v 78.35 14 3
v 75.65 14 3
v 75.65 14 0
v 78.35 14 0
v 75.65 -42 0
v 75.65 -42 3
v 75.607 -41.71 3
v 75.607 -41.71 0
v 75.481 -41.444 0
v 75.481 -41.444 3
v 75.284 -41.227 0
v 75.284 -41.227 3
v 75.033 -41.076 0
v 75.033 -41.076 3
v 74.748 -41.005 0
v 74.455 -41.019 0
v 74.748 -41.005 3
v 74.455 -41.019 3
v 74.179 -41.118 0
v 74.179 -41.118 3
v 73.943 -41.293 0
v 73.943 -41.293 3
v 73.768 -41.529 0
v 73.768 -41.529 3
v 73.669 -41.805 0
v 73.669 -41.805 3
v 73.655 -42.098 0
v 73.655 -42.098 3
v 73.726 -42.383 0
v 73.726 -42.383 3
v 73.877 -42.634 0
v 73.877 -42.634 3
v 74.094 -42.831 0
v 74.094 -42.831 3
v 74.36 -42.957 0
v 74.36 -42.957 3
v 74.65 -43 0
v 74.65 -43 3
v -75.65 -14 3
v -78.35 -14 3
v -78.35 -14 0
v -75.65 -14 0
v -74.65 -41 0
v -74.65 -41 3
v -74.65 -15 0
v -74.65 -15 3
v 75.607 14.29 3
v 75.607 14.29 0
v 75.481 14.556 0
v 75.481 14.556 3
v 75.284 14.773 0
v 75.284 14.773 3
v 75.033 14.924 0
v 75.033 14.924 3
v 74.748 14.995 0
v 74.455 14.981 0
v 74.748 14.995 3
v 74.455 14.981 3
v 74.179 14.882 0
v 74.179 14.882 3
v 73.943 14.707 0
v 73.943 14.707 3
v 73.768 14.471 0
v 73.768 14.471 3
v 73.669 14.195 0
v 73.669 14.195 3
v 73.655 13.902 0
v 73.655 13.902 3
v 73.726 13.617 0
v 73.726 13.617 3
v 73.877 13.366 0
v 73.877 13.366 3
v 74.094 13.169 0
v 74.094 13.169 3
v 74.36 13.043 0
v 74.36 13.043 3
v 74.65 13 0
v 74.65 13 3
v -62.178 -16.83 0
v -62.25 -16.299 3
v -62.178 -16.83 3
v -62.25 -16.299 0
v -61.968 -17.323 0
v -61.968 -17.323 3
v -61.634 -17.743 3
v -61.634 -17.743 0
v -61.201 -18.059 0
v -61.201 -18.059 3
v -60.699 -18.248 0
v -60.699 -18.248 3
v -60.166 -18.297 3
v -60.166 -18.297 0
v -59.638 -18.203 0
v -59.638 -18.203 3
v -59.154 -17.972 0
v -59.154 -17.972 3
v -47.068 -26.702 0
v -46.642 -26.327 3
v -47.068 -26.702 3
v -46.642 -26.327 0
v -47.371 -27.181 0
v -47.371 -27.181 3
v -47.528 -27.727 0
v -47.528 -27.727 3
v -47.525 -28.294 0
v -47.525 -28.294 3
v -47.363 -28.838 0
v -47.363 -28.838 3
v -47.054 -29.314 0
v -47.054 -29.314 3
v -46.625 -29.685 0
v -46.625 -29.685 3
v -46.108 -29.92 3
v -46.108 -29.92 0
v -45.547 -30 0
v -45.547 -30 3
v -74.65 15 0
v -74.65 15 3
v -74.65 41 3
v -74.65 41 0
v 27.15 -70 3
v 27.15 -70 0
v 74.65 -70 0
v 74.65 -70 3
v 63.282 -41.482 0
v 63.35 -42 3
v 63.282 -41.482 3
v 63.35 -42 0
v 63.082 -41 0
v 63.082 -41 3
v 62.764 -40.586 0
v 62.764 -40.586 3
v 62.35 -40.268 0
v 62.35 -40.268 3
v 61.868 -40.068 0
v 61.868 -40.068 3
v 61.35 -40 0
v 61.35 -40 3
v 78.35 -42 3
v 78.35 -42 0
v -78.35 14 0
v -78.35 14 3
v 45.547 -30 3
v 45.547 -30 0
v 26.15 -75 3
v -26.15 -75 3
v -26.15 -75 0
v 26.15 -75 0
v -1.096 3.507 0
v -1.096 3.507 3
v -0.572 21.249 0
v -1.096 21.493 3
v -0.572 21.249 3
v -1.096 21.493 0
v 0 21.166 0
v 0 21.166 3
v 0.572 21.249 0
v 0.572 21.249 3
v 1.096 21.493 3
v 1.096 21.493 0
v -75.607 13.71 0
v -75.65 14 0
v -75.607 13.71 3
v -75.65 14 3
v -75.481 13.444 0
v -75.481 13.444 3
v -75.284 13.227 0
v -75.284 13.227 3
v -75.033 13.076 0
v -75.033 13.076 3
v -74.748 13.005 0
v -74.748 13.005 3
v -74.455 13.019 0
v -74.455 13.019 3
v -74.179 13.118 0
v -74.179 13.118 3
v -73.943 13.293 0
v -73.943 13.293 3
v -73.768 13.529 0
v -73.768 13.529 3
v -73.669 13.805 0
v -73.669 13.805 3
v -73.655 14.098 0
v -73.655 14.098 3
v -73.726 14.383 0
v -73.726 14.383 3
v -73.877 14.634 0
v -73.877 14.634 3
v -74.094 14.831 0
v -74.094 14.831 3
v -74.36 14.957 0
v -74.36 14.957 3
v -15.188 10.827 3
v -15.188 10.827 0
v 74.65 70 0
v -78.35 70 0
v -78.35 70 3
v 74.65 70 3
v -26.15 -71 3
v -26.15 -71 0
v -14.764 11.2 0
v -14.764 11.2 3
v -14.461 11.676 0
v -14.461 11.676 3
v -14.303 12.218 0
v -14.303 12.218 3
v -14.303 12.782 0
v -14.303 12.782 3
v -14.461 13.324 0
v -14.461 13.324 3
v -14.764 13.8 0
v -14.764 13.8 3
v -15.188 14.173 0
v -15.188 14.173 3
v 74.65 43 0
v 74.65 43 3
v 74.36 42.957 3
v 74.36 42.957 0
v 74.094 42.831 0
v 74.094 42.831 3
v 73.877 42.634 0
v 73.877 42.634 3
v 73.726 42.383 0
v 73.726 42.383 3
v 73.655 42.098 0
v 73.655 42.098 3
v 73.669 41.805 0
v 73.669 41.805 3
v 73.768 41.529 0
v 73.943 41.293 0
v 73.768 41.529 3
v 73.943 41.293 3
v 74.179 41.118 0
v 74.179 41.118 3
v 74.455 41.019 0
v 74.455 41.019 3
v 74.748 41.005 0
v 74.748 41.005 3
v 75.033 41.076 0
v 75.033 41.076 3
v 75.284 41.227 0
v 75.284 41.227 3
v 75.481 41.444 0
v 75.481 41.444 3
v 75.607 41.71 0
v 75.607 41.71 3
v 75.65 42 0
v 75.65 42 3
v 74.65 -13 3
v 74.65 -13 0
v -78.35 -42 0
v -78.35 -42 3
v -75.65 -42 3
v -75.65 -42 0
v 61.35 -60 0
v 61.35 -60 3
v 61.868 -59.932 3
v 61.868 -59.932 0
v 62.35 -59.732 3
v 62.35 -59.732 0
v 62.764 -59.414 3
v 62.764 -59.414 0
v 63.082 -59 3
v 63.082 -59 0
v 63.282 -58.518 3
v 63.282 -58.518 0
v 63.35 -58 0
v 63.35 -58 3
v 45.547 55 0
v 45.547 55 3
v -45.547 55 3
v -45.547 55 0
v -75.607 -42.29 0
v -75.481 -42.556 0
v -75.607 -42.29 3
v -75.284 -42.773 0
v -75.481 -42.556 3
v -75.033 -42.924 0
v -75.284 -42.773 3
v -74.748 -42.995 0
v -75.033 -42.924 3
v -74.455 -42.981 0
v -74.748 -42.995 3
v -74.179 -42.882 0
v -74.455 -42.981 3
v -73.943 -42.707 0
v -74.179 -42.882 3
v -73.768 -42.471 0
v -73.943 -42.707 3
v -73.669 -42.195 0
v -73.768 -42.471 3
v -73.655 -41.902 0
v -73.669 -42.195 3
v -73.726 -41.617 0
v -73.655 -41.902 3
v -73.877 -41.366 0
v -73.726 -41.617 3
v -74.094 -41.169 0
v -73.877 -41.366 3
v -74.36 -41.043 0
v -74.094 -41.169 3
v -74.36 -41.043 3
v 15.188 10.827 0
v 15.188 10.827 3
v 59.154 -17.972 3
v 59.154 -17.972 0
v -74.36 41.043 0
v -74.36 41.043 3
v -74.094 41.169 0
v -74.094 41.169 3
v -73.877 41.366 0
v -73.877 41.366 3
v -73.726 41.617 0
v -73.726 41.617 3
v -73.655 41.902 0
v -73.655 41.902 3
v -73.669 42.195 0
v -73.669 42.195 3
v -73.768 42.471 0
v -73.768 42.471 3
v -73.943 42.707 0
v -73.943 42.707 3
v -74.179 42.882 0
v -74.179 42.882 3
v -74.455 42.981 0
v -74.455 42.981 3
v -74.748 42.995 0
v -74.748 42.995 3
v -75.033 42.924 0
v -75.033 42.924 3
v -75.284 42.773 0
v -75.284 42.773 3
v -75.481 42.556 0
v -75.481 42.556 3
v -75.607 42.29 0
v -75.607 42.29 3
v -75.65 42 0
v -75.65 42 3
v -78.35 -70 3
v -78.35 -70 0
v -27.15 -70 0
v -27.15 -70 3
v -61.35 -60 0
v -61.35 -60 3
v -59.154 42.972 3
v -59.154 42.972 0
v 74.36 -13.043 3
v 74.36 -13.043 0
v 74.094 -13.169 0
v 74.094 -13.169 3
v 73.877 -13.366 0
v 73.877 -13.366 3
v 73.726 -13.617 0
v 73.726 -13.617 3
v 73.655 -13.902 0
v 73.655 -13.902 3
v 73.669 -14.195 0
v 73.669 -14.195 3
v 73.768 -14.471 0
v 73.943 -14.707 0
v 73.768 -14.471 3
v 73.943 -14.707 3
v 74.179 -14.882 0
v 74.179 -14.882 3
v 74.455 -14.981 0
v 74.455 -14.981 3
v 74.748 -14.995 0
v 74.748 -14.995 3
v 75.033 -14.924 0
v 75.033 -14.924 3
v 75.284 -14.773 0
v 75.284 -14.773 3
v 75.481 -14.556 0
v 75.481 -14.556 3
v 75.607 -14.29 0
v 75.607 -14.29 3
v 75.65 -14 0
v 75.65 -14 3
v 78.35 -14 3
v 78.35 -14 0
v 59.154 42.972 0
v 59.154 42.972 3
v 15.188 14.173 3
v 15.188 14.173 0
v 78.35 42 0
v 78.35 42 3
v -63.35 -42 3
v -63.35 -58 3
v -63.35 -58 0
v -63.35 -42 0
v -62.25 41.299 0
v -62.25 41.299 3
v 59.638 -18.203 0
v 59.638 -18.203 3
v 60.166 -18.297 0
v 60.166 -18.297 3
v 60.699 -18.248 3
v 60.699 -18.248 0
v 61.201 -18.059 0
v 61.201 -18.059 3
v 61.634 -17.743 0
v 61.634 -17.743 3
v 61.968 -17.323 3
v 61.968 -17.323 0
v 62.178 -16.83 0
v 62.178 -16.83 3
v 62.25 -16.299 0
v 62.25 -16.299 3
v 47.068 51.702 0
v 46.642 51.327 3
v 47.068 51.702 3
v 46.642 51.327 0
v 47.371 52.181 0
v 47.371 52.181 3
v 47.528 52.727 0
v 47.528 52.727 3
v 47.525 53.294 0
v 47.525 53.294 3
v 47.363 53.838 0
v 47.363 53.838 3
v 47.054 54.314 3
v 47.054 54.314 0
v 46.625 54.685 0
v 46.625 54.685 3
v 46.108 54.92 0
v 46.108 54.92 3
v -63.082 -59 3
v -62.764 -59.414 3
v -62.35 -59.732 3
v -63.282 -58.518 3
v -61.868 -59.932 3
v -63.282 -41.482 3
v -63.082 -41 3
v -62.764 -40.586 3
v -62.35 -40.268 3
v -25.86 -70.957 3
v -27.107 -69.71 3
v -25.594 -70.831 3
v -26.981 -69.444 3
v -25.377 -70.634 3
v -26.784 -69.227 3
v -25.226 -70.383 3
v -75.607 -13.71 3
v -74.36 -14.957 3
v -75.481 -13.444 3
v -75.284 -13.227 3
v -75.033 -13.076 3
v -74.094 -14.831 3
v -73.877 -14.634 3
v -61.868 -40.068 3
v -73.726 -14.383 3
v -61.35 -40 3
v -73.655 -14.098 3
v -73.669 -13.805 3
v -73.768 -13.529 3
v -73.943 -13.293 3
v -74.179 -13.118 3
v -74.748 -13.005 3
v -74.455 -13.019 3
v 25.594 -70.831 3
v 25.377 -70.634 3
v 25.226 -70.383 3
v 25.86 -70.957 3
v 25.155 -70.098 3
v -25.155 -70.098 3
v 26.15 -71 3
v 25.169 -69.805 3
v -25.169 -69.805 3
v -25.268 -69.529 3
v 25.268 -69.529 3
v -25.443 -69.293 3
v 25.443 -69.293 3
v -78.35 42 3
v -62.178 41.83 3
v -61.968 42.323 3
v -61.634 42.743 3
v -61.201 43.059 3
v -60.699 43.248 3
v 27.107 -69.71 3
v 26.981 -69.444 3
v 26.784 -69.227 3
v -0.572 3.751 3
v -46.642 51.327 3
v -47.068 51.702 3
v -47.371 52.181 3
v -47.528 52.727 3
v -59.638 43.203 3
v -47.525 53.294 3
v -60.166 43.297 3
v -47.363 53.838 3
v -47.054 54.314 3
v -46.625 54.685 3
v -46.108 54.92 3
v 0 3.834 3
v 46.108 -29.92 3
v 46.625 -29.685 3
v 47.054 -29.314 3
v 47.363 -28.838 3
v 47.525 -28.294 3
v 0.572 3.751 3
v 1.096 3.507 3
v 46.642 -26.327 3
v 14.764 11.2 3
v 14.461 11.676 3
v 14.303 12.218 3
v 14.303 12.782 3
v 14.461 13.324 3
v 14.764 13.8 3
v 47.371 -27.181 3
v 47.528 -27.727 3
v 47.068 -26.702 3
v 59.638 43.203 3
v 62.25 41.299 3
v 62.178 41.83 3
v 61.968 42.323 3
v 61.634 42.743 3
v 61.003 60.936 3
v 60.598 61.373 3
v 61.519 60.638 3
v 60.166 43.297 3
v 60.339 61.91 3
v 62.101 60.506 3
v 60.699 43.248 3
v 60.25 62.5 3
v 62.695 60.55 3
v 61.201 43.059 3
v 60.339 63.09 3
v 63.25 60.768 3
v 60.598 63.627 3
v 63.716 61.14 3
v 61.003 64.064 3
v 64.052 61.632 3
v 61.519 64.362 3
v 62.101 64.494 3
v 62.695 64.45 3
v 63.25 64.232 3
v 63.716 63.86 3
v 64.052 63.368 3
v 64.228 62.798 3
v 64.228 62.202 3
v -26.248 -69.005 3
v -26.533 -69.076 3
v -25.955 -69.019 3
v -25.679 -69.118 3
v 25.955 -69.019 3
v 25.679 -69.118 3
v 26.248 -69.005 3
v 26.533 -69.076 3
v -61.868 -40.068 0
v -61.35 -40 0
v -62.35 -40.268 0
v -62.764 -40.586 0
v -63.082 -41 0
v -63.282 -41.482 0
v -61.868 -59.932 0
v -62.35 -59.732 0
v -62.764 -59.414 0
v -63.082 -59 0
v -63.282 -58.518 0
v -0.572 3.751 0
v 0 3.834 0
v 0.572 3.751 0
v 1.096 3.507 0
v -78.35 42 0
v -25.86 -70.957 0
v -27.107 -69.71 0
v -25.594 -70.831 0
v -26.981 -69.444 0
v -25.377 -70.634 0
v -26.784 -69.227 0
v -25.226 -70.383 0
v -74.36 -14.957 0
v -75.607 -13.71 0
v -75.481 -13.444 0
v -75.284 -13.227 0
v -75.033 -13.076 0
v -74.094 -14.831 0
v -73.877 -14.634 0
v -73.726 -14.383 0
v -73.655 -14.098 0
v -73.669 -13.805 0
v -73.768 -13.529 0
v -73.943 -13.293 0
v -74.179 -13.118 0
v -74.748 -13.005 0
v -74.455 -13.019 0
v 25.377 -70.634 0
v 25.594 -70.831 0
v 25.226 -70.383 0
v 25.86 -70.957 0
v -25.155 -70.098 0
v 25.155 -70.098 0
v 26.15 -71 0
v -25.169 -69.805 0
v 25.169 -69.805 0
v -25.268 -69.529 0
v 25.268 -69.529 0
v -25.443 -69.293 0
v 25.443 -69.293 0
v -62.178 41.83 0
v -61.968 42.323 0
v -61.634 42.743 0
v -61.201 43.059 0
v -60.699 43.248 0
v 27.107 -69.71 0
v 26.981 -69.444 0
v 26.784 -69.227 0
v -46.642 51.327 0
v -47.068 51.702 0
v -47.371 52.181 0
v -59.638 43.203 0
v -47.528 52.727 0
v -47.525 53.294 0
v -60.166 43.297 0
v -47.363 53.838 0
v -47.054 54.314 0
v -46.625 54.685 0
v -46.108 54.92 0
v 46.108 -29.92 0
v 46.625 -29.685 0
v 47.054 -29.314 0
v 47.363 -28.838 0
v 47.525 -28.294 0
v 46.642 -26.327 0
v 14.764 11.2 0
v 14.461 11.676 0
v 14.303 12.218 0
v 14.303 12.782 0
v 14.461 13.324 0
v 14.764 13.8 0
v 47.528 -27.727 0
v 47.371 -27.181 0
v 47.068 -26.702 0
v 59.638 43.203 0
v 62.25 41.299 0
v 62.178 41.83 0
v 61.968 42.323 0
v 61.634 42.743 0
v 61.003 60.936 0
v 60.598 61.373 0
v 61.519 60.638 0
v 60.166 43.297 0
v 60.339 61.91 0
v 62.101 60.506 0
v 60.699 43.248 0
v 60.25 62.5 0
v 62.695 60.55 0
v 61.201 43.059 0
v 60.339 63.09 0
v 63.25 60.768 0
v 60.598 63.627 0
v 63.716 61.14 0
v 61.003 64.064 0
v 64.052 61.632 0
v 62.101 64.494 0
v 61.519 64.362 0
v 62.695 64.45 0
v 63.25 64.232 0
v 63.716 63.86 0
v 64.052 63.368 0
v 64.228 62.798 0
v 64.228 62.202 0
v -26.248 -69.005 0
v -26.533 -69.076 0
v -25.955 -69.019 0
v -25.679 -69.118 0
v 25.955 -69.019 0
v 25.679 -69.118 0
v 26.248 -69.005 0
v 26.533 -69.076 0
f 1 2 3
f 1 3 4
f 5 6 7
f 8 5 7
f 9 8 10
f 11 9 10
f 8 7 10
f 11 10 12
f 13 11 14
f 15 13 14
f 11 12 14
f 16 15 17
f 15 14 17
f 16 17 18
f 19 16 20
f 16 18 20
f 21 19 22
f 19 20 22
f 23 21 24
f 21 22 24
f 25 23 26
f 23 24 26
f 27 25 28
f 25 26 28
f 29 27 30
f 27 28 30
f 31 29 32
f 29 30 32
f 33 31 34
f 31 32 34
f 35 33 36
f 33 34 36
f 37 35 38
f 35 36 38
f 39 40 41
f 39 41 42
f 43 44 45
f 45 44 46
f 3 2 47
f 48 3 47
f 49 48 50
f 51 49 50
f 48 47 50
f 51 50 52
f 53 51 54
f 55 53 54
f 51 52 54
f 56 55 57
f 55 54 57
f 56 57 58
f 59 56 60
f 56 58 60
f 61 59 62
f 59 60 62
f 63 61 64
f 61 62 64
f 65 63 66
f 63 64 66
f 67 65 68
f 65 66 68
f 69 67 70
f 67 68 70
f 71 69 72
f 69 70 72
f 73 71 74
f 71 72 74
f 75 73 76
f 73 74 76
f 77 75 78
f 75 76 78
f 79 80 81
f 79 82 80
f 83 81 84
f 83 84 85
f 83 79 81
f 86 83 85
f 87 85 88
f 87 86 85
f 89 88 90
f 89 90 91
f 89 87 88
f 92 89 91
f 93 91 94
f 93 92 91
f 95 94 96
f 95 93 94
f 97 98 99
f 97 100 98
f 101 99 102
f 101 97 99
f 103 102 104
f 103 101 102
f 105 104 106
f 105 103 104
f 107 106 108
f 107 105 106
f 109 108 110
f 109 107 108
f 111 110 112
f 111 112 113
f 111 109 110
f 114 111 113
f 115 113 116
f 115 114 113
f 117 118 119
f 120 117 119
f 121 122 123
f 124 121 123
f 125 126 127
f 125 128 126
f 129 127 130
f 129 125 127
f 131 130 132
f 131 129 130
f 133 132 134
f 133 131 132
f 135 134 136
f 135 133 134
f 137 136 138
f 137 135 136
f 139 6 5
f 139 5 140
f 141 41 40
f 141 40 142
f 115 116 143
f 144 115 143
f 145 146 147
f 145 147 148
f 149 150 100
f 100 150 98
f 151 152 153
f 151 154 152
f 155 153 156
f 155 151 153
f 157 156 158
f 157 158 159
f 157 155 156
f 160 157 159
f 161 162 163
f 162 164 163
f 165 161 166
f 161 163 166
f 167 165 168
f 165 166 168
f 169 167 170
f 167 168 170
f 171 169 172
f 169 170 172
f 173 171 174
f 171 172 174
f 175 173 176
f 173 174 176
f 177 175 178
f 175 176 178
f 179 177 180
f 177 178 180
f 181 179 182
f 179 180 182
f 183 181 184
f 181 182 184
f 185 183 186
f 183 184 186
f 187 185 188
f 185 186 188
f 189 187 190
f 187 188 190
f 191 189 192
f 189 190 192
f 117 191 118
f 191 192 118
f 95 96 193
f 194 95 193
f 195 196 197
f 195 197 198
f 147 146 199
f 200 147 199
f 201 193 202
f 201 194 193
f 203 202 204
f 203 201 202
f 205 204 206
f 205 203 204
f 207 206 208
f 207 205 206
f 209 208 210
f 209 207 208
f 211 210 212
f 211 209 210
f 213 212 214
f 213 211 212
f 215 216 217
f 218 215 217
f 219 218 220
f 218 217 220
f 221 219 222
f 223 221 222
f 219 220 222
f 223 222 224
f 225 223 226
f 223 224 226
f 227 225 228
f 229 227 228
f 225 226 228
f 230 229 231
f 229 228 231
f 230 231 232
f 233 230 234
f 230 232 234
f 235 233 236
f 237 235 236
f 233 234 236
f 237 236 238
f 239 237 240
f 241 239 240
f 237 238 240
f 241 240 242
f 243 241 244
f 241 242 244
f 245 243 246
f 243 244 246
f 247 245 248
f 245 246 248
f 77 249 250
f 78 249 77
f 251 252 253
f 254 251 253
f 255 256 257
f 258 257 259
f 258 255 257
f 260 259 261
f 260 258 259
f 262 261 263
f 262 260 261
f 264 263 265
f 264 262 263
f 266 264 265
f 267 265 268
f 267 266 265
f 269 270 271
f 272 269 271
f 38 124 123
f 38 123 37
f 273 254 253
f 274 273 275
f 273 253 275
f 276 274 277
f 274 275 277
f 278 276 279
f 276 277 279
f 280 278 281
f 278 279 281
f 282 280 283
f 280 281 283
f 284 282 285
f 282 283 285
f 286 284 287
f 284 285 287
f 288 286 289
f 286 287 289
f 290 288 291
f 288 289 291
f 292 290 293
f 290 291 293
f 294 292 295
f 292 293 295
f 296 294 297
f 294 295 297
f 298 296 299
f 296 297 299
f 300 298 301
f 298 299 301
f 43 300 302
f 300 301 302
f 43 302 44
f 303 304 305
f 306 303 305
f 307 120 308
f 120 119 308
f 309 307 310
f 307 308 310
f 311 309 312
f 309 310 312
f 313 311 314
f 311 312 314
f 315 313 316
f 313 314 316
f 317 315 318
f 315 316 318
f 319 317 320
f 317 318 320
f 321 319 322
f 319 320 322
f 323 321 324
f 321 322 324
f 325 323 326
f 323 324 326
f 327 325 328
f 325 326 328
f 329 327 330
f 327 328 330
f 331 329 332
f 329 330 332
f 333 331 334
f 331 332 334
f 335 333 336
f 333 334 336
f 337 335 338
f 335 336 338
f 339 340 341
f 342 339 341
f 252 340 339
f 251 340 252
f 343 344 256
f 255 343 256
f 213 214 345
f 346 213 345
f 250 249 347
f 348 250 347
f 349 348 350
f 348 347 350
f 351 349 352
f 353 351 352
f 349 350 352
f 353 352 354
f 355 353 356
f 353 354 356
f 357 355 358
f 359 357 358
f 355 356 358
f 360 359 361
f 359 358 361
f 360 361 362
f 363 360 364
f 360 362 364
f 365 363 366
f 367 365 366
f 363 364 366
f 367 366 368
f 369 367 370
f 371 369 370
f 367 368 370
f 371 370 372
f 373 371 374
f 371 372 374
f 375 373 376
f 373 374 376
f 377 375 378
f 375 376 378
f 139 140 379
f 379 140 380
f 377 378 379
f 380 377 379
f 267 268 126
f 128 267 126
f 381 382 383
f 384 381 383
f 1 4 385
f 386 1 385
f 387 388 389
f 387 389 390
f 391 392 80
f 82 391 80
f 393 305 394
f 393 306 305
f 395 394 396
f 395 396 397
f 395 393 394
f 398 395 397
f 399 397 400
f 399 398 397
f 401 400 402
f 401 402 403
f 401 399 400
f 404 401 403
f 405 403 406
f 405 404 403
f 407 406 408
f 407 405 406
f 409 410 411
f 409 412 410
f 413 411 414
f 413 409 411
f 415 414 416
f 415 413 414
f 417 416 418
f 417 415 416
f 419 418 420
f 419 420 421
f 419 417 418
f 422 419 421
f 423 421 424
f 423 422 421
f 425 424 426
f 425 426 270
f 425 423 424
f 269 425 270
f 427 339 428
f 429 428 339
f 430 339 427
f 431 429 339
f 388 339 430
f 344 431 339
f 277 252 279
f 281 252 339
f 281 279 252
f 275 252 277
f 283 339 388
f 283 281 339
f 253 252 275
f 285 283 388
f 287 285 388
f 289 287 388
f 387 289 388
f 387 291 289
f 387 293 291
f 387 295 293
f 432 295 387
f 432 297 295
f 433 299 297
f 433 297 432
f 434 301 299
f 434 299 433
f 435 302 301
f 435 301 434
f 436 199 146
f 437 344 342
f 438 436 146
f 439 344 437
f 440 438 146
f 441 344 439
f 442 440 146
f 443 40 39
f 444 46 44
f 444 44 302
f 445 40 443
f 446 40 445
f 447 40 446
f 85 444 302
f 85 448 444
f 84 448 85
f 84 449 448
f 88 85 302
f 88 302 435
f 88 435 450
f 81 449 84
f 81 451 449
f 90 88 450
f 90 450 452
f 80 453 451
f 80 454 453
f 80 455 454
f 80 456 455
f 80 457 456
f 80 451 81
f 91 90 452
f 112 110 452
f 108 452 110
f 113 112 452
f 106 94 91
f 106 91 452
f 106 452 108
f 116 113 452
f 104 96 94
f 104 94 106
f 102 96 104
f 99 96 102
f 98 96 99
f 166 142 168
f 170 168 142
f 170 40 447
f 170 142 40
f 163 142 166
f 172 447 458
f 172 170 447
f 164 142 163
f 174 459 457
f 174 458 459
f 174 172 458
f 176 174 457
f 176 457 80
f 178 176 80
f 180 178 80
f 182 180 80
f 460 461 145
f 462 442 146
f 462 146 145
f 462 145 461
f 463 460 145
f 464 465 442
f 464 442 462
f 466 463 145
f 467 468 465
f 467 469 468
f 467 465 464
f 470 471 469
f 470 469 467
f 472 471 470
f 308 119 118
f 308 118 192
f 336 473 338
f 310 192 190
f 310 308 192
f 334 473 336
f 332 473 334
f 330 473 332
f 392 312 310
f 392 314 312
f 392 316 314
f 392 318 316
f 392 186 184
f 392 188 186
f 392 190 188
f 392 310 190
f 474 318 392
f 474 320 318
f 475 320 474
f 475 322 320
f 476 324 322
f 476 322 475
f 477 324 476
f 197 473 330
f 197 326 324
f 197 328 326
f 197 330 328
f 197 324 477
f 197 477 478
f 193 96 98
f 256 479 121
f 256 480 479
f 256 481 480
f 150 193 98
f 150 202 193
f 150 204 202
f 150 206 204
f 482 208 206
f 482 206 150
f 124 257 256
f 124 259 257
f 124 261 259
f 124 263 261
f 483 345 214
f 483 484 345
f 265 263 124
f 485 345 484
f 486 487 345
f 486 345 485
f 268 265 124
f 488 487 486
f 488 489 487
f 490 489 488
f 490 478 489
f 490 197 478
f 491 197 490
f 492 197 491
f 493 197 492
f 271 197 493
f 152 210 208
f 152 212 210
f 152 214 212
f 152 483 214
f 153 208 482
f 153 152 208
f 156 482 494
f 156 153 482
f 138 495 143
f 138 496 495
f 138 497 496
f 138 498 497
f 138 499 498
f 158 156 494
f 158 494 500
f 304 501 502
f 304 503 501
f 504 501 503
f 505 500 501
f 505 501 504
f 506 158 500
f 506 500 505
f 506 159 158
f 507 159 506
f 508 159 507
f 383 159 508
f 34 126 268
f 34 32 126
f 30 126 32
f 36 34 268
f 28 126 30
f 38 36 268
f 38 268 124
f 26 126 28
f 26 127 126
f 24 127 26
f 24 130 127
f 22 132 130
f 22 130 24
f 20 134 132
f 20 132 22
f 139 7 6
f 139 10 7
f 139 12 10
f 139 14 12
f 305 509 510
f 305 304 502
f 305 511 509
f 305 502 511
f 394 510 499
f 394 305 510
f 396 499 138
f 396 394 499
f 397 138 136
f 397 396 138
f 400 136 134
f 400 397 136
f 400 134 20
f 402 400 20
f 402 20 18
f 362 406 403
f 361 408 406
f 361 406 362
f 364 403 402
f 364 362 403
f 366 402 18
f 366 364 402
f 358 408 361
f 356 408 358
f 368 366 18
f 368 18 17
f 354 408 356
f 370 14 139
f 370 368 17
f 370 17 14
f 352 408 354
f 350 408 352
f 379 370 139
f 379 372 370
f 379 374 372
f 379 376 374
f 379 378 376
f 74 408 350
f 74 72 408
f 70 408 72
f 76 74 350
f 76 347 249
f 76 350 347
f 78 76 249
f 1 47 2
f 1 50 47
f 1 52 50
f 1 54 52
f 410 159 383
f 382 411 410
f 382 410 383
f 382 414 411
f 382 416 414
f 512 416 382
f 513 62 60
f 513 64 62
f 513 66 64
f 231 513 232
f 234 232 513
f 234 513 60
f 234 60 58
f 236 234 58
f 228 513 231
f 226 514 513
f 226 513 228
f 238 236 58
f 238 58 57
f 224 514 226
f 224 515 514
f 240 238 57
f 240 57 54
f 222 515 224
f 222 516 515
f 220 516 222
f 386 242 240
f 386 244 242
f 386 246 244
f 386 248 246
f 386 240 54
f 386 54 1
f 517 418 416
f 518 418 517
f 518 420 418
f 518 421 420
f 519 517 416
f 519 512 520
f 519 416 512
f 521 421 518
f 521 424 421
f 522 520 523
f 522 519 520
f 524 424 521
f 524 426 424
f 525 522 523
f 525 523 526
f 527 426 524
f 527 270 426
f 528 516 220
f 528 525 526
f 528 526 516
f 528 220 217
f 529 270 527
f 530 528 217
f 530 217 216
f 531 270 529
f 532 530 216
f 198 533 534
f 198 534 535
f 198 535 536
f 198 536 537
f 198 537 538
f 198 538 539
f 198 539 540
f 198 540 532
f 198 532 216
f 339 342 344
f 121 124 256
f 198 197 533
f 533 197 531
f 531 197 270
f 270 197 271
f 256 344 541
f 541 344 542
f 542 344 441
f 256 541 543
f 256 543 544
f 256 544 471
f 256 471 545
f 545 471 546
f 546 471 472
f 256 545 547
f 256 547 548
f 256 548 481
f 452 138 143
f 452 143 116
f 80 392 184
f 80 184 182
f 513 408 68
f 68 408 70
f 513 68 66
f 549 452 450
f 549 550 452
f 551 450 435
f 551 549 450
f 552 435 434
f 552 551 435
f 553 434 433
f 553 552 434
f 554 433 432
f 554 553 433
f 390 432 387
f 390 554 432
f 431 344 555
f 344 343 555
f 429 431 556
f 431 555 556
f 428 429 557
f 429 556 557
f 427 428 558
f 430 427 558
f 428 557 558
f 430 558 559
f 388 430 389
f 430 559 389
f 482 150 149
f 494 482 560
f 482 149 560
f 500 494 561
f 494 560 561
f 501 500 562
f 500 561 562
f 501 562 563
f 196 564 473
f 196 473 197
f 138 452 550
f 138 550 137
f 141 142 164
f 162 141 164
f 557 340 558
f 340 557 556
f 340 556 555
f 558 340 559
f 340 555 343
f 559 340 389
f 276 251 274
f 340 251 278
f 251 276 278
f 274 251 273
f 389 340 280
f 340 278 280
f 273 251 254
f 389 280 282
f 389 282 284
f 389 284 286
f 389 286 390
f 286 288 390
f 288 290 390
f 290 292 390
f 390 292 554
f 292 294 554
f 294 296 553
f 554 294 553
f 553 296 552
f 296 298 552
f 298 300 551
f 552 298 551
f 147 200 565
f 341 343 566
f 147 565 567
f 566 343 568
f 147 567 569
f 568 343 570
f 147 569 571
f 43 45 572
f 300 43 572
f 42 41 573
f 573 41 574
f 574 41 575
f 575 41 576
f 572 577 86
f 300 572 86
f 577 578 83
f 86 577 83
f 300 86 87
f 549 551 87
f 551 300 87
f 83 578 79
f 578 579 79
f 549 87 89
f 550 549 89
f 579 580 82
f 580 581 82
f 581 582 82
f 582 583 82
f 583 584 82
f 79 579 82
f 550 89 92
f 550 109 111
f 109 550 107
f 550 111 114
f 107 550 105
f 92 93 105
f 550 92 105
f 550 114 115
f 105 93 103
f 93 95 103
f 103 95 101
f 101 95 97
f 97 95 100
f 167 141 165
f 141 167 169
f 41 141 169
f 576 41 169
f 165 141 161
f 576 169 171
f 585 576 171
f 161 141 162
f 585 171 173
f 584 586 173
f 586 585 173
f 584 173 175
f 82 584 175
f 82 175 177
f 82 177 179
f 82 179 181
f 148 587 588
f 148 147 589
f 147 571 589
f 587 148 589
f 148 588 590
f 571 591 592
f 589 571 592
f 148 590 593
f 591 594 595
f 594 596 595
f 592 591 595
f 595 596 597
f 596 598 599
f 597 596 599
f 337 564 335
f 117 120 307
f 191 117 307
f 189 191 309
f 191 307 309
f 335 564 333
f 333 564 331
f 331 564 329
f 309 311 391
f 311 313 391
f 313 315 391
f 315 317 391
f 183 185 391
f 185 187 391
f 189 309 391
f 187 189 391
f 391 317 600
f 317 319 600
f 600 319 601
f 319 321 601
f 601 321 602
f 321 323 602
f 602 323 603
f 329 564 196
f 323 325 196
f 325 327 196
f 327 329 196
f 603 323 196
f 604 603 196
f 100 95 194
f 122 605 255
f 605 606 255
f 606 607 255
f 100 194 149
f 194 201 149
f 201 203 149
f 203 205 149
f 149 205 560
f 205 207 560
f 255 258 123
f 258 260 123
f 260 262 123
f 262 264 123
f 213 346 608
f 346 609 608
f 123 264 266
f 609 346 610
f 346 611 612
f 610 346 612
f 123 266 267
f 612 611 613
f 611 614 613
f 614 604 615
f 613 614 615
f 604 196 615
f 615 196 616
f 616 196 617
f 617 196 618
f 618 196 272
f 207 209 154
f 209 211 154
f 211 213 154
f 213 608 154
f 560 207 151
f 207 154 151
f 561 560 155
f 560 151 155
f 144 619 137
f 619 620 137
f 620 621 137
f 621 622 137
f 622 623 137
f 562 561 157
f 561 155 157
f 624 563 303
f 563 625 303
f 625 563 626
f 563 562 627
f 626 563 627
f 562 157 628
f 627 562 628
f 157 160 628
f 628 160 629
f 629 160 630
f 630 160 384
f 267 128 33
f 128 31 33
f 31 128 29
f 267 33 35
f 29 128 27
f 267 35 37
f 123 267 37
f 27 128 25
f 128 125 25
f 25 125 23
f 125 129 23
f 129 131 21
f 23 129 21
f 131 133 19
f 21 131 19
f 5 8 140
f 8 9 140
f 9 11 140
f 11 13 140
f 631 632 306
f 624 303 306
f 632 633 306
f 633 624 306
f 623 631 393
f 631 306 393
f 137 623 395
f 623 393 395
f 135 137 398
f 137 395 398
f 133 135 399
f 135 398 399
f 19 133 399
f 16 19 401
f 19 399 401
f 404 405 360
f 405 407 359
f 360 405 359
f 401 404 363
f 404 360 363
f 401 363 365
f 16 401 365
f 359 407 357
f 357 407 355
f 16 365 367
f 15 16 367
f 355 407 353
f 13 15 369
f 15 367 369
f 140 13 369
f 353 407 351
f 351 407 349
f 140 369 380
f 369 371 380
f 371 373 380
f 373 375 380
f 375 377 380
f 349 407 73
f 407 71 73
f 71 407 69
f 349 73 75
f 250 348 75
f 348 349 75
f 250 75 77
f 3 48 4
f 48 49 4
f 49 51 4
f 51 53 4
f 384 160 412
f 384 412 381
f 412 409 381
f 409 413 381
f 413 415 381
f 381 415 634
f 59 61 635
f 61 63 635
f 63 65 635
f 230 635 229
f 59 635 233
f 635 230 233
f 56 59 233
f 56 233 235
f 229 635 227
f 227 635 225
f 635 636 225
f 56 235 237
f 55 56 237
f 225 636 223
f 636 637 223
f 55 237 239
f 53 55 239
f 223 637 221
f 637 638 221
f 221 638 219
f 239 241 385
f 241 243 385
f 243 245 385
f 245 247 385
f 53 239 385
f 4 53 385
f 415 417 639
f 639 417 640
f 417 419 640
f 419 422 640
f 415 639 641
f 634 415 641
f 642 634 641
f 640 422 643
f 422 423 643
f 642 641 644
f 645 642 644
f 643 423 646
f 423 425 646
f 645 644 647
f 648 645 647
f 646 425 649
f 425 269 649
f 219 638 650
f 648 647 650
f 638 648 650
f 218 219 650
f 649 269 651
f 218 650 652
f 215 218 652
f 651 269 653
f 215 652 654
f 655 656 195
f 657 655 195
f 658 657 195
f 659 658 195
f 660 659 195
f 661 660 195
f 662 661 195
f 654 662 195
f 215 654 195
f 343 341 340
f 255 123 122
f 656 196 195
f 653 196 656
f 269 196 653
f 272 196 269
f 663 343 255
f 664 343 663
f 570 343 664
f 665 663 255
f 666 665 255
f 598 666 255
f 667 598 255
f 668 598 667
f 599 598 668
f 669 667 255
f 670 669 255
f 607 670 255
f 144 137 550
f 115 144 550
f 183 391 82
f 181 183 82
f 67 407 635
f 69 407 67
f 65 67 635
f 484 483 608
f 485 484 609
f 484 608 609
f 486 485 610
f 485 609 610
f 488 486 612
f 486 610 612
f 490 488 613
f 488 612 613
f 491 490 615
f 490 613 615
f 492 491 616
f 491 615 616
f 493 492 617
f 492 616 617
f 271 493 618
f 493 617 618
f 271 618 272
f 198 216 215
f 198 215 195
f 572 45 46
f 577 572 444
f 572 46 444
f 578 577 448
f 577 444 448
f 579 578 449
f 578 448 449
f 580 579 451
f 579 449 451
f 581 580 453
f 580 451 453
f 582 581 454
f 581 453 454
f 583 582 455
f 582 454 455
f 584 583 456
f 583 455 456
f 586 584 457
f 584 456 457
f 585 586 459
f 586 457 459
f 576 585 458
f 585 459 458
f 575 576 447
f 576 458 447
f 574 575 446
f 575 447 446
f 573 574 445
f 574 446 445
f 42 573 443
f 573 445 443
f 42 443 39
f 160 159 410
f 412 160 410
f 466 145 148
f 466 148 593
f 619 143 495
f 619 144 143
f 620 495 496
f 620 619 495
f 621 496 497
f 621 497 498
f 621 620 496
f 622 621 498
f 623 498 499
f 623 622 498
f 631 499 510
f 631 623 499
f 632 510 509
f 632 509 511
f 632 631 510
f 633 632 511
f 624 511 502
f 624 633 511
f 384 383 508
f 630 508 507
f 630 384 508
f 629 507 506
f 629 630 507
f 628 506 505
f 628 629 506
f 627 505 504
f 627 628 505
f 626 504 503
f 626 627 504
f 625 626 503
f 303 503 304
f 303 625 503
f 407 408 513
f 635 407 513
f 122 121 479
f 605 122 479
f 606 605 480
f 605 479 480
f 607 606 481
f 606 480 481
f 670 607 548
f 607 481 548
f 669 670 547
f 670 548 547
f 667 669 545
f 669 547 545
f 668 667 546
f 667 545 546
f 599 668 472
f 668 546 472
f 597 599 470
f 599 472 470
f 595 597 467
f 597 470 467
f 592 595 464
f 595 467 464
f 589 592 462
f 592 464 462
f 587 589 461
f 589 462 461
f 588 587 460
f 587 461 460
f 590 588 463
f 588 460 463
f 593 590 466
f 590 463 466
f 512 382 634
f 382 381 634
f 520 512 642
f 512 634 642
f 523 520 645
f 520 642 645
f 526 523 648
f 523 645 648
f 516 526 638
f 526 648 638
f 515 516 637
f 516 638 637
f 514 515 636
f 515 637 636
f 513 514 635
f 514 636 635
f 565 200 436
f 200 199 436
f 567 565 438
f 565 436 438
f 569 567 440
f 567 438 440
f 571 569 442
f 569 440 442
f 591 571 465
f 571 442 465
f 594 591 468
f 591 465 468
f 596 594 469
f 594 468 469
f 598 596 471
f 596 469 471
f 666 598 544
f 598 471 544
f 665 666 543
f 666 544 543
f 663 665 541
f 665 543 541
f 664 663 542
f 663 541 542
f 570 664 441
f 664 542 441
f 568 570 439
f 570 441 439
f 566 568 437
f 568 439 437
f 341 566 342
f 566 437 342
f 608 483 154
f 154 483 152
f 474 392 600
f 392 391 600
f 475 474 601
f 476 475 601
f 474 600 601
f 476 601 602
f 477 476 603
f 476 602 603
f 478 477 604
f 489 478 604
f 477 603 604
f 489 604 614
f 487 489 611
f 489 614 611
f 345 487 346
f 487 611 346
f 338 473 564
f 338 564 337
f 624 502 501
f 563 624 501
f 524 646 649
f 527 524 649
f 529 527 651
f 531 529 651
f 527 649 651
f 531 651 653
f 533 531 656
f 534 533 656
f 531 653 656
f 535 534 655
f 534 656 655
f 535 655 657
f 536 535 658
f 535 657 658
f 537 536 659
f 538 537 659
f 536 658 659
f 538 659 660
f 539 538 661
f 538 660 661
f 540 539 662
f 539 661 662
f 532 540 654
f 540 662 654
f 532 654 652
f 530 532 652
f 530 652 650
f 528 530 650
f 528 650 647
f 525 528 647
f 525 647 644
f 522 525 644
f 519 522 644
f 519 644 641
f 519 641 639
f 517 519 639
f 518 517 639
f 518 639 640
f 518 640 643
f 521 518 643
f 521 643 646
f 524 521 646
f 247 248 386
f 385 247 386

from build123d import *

# Parameters (mm, degrees)
SKETCH1_W           = 156.7
SKETCH1_H           = 140
BOSS_EXTRUDE1_DEPTH = 3
SKETCH2_W           = 126.7
SKETCH2_H           = 20
CUT_EXTRUDE1_DEPTH  = 106.108146687
FILLET1_R           = 2
SKETCH3_W           = 3.7
SKETCH3_H           = 28
CUT_EXTRUDE2_DEPTH  = 106.108146687
SKETCH4_W           = 52.3
SKETCH4_H           = 5
BOSS_EXTRUDE2_DEPTH = 3
SKETCH5_R           = 1
CUT_EXTRUDE3_DEPTH  = 109.502177398
SKETCH6_R           = 2
CUT_EXTRUDE4_DEPTH  = 109.502177398


with BuildPart() as part:
    # Sketch1 → Boss-Extrude1 (new body)
    with BuildSketch(Plane.XY):
        Rectangle(SKETCH1_W, SKETCH1_H)
    extrude(amount=BOSS_EXTRUDE1_DEPTH)

    # Sketch2 → Cut-Extrude1 (cut, through all)
    with BuildSketch(Plane.XY.offset(3)):
        with Locations((0, -50)):
            Rectangle(SKETCH2_W, SKETCH2_H)
        Polygon((-62.25, 45), (-62.25, -20), (-12.633333333, 12.5), align=None)
        Polygon((0, 4.22489083), (-52.25, -30), (52.25, -30), align=None)
        Polygon((-52.25, 55), (0, 20.77510917), (52.25, 55), align=None)
        Polygon((62.25, 45), (12.633333333, 12.5), (62.25, -20), align=None)
    extrude(amount=-CUT_EXTRUDE1_DEPTH, mode=Mode.SUBTRACT)

    # Fillet1
    fillet1_edges = [part.edges().sort_by_distance(p)[0] for p in [
        (63.35, -60, 1.5),
        (-63.35, -60, 1.5),
        (-63.35, -40, 1.5),
        (63.35, -40, 1.5),
        (-12.633333333, 12.5, 1.5),
        (-62.25, -20, 1.5),
        (-62.25, 45, 1.5),
        (-52.25, -30, 1.5),
        (0, 4.22489083, 1.5),
        (52.25, -30, 1.5),
        (52.25, 55, 1.5),
        (0, 20.77510917, 1.5),
        (-52.25, 55, 1.5),
        (12.633333333, 12.5, 1.5),
        (62.25, 45, 1.5),
        (62.25, -20, 1.5),
    ]]
    fillet(fillet1_edges, radius=FILLET1_R)

    # Sketch3 → Cut-Extrude2 (cut, through all)
    with BuildSketch(Plane.XY.offset(3)):
        with Locations((-76.5, 28)):
            Rectangle(SKETCH3_W, SKETCH3_H)
        with Locations((-76.5, -28)):
            Rectangle(SKETCH3_W, SKETCH3_H)
        with Locations((76.5, 56)):
            Rectangle(SKETCH3_W, SKETCH3_H)
        with Locations((76.5, 0)):
            Rectangle(SKETCH3_W, SKETCH3_H)
        with Locations((76.5, -56)):
            Rectangle(SKETCH3_W, SKETCH3_H)
    extrude(amount=-CUT_EXTRUDE2_DEPTH, mode=Mode.SUBTRACT)

    # Sketch4 → Boss-Extrude2 (add)
    with BuildSketch(Plane.XY.offset(3)):
        with Locations((0, -72.5)):
            Rectangle(SKETCH4_W, SKETCH4_H)
    extrude(amount=-BOSS_EXTRUDE2_DEPTH)

    # Sketch5 → Cut-Extrude3 (cut, through all)
    with BuildSketch(Plane.XY.offset(3)):
        with Locations((-74.65, 42)):
            Circle(SKETCH5_R)
        with Locations((-74.65, 14)):
            Circle(SKETCH5_R)
        with Locations((-74.65, -14)):
            Circle(SKETCH5_R)
        with Locations((-74.65, -42)):
            Circle(SKETCH5_R)
        with Locations((-26.15, -70)):
            Circle(SKETCH5_R)
        with Locations((26.15, -70)):
            Circle(SKETCH5_R)
        with Locations((74.65, -42)):
            Circle(SKETCH5_R)
        with Locations((74.65, -14)):
            Circle(SKETCH5_R)
        with Locations((74.65, 42)):
            Circle(SKETCH5_R)
        with Locations((74.65, 14)):
            Circle(SKETCH5_R)
    extrude(amount=-CUT_EXTRUDE3_DEPTH, mode=Mode.SUBTRACT)

    # Sketch6 → Cut-Extrude4 (cut, through all)
    with BuildSketch(Plane(origin=(0, 0, 0), x_dir=(-1, 0, 0), z_dir=(0, 0, -1))):
        with Locations((-62.25, 62.5)):
            Circle(SKETCH6_R)
    extrude(amount=-CUT_EXTRUDE4_DEPTH, mode=Mode.SUBTRACT)


solid = part.part
